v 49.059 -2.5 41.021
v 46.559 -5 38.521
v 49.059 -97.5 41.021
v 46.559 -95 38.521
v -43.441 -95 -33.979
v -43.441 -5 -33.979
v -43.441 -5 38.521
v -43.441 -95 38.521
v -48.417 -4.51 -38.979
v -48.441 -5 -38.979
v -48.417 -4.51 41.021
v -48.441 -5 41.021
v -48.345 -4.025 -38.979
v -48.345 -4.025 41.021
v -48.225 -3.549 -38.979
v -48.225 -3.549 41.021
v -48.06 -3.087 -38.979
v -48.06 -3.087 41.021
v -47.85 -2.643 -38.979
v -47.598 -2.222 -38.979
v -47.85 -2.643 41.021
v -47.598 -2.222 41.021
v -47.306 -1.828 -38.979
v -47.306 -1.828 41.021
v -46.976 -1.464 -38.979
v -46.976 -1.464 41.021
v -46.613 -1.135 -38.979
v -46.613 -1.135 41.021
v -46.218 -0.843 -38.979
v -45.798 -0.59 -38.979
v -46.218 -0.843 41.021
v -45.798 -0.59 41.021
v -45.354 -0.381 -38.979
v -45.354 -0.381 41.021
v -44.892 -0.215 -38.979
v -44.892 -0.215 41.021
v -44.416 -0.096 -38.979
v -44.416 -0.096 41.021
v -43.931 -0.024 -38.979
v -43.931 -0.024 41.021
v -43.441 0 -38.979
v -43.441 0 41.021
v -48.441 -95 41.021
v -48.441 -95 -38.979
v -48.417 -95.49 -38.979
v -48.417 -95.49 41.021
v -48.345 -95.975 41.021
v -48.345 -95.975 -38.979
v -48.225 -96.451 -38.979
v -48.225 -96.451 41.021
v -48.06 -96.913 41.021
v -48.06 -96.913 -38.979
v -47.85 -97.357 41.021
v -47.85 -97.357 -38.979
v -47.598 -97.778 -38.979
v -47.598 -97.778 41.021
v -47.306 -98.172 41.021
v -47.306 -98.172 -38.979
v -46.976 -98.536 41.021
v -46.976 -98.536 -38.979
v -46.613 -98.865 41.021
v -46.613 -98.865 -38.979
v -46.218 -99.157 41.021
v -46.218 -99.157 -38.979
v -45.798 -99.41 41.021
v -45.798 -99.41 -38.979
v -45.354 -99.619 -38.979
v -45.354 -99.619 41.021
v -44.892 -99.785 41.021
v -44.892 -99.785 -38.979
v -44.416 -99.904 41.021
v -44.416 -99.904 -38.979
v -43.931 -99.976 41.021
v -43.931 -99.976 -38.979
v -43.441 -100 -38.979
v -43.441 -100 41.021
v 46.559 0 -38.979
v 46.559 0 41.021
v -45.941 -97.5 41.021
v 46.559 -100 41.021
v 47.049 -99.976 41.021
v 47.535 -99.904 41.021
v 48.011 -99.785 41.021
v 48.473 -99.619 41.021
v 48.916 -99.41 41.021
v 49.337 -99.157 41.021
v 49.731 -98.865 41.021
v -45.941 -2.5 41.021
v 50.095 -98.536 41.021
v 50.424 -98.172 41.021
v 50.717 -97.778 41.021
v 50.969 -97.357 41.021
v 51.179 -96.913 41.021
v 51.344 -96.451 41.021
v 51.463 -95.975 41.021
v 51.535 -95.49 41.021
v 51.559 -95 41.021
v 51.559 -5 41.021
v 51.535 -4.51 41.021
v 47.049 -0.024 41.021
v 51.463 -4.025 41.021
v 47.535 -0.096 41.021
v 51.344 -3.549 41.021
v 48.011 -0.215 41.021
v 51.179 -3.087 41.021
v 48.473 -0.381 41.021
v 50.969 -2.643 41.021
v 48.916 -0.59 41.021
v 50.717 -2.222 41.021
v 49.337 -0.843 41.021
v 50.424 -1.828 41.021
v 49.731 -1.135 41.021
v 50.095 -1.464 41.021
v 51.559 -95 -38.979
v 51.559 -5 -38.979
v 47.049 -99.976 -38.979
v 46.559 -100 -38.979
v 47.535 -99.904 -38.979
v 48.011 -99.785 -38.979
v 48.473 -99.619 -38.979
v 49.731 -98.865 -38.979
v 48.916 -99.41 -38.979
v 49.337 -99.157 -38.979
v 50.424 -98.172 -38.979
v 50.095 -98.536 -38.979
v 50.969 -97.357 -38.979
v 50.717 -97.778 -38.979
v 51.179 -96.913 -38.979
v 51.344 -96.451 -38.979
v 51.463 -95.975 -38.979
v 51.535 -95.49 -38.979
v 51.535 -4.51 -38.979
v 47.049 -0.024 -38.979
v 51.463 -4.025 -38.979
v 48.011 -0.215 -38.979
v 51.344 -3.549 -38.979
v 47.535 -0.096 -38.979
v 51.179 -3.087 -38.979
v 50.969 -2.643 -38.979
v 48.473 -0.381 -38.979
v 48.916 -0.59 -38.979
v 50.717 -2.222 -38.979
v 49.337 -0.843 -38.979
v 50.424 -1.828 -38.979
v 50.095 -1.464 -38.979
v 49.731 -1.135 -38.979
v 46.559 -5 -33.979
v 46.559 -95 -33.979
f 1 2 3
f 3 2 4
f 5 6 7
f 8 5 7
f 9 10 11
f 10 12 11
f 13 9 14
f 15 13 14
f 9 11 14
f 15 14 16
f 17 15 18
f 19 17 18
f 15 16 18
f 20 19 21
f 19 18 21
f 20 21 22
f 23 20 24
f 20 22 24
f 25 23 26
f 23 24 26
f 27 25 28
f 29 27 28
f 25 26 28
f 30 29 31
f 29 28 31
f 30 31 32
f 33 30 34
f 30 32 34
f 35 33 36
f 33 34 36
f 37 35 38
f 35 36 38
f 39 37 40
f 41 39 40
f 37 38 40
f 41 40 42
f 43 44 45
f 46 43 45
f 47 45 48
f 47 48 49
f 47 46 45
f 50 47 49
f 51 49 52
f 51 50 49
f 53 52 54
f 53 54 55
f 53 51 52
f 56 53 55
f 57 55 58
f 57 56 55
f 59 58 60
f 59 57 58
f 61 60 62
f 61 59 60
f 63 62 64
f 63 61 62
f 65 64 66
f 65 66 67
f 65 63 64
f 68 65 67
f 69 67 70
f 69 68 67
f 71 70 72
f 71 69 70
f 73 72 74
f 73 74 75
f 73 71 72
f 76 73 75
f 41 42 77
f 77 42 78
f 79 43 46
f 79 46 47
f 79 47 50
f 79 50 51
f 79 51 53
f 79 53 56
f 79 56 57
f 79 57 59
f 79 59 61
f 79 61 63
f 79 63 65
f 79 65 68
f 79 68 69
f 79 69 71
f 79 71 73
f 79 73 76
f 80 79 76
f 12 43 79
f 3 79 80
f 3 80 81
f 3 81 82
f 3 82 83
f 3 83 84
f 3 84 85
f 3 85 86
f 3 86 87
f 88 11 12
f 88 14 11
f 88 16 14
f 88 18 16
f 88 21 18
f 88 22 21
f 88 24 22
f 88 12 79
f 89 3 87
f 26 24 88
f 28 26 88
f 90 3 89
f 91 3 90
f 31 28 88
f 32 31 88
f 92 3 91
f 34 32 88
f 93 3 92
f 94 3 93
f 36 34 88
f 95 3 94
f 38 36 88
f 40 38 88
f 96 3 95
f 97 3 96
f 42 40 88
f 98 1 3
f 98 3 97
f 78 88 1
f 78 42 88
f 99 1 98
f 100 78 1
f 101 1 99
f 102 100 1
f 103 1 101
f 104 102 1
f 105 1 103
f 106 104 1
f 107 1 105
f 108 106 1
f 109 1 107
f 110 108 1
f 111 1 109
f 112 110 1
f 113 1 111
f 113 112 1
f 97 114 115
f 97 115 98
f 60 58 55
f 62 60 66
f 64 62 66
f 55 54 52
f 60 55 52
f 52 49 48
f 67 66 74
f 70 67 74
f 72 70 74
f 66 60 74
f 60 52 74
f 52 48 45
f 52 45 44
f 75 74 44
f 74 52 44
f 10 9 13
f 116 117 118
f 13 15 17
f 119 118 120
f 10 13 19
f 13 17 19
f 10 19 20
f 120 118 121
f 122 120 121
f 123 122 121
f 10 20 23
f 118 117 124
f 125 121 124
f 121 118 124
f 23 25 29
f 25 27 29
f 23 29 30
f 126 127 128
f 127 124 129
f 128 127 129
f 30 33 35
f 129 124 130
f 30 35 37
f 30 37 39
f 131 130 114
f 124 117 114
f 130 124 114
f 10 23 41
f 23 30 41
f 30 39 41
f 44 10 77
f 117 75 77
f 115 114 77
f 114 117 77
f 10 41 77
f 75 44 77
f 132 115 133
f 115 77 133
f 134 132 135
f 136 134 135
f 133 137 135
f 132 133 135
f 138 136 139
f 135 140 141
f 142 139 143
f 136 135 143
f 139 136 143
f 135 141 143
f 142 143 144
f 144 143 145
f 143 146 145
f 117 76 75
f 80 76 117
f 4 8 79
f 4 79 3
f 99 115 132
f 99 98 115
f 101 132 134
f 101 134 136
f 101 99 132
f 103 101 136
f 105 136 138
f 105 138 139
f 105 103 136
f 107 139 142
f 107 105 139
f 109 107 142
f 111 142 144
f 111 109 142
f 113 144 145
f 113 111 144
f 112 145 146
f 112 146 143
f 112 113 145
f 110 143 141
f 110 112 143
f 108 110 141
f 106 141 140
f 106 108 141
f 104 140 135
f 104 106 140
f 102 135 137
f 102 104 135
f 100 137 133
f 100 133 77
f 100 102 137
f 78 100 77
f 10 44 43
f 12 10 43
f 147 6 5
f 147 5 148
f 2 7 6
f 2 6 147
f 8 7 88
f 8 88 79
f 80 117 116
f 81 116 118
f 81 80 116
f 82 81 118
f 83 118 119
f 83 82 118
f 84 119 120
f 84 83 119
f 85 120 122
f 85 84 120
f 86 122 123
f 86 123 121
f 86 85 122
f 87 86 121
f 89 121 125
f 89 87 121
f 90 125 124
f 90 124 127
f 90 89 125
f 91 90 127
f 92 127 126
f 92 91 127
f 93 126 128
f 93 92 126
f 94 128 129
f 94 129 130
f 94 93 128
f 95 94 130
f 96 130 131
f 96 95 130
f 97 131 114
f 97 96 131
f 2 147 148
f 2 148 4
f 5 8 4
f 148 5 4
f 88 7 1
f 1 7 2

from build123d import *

# Parameters (mm, degrees)
F0_W     = 100
F0_H     = 80
F1_DEPTH = 100
F2_T     = -5
F3_SIZE  = 2.5
F4_R     = 5


with BuildPart() as f1:
    # F0 (on Front) → F1 (new body)
    with BuildSketch(Plane.XZ):
        with Locations((1.5594035387, 1.0211700201)):
            Rectangle(F0_W, F0_H)
    extrude(amount=F1_DEPTH)

    # F2
    f2_openings = [f1.faces().sort_by_distance(p)[0] for p in [
        (1.559404, -50, 41.02117),
    ]]
    offset(amount=F2_T, openings=f2_openings)

    # F3
    f3_edges = [f1.edges().sort_by_distance(p)[0] for p in [
        (1.559404, -5, 41.02117),
        (-43.440596, -50, 41.02117),
        (1.559404, -95, 41.02117),
        (46.559404, -50, 41.02117),
    ]]
    chamfer(f3_edges, length=F3_SIZE)

    # F4
    f4_edges = [f1.edges().sort_by_distance(p)[0] for p in [
        (-48.440596, -100, 1.02117),
        (51.559404, -100, 1.02117),
        (51.559404, 0, 1.02117),
        (-48.440596, 0, 1.02117),
    ]]
    fillet(f4_edges, radius=F4_R)


solid = f1.part
